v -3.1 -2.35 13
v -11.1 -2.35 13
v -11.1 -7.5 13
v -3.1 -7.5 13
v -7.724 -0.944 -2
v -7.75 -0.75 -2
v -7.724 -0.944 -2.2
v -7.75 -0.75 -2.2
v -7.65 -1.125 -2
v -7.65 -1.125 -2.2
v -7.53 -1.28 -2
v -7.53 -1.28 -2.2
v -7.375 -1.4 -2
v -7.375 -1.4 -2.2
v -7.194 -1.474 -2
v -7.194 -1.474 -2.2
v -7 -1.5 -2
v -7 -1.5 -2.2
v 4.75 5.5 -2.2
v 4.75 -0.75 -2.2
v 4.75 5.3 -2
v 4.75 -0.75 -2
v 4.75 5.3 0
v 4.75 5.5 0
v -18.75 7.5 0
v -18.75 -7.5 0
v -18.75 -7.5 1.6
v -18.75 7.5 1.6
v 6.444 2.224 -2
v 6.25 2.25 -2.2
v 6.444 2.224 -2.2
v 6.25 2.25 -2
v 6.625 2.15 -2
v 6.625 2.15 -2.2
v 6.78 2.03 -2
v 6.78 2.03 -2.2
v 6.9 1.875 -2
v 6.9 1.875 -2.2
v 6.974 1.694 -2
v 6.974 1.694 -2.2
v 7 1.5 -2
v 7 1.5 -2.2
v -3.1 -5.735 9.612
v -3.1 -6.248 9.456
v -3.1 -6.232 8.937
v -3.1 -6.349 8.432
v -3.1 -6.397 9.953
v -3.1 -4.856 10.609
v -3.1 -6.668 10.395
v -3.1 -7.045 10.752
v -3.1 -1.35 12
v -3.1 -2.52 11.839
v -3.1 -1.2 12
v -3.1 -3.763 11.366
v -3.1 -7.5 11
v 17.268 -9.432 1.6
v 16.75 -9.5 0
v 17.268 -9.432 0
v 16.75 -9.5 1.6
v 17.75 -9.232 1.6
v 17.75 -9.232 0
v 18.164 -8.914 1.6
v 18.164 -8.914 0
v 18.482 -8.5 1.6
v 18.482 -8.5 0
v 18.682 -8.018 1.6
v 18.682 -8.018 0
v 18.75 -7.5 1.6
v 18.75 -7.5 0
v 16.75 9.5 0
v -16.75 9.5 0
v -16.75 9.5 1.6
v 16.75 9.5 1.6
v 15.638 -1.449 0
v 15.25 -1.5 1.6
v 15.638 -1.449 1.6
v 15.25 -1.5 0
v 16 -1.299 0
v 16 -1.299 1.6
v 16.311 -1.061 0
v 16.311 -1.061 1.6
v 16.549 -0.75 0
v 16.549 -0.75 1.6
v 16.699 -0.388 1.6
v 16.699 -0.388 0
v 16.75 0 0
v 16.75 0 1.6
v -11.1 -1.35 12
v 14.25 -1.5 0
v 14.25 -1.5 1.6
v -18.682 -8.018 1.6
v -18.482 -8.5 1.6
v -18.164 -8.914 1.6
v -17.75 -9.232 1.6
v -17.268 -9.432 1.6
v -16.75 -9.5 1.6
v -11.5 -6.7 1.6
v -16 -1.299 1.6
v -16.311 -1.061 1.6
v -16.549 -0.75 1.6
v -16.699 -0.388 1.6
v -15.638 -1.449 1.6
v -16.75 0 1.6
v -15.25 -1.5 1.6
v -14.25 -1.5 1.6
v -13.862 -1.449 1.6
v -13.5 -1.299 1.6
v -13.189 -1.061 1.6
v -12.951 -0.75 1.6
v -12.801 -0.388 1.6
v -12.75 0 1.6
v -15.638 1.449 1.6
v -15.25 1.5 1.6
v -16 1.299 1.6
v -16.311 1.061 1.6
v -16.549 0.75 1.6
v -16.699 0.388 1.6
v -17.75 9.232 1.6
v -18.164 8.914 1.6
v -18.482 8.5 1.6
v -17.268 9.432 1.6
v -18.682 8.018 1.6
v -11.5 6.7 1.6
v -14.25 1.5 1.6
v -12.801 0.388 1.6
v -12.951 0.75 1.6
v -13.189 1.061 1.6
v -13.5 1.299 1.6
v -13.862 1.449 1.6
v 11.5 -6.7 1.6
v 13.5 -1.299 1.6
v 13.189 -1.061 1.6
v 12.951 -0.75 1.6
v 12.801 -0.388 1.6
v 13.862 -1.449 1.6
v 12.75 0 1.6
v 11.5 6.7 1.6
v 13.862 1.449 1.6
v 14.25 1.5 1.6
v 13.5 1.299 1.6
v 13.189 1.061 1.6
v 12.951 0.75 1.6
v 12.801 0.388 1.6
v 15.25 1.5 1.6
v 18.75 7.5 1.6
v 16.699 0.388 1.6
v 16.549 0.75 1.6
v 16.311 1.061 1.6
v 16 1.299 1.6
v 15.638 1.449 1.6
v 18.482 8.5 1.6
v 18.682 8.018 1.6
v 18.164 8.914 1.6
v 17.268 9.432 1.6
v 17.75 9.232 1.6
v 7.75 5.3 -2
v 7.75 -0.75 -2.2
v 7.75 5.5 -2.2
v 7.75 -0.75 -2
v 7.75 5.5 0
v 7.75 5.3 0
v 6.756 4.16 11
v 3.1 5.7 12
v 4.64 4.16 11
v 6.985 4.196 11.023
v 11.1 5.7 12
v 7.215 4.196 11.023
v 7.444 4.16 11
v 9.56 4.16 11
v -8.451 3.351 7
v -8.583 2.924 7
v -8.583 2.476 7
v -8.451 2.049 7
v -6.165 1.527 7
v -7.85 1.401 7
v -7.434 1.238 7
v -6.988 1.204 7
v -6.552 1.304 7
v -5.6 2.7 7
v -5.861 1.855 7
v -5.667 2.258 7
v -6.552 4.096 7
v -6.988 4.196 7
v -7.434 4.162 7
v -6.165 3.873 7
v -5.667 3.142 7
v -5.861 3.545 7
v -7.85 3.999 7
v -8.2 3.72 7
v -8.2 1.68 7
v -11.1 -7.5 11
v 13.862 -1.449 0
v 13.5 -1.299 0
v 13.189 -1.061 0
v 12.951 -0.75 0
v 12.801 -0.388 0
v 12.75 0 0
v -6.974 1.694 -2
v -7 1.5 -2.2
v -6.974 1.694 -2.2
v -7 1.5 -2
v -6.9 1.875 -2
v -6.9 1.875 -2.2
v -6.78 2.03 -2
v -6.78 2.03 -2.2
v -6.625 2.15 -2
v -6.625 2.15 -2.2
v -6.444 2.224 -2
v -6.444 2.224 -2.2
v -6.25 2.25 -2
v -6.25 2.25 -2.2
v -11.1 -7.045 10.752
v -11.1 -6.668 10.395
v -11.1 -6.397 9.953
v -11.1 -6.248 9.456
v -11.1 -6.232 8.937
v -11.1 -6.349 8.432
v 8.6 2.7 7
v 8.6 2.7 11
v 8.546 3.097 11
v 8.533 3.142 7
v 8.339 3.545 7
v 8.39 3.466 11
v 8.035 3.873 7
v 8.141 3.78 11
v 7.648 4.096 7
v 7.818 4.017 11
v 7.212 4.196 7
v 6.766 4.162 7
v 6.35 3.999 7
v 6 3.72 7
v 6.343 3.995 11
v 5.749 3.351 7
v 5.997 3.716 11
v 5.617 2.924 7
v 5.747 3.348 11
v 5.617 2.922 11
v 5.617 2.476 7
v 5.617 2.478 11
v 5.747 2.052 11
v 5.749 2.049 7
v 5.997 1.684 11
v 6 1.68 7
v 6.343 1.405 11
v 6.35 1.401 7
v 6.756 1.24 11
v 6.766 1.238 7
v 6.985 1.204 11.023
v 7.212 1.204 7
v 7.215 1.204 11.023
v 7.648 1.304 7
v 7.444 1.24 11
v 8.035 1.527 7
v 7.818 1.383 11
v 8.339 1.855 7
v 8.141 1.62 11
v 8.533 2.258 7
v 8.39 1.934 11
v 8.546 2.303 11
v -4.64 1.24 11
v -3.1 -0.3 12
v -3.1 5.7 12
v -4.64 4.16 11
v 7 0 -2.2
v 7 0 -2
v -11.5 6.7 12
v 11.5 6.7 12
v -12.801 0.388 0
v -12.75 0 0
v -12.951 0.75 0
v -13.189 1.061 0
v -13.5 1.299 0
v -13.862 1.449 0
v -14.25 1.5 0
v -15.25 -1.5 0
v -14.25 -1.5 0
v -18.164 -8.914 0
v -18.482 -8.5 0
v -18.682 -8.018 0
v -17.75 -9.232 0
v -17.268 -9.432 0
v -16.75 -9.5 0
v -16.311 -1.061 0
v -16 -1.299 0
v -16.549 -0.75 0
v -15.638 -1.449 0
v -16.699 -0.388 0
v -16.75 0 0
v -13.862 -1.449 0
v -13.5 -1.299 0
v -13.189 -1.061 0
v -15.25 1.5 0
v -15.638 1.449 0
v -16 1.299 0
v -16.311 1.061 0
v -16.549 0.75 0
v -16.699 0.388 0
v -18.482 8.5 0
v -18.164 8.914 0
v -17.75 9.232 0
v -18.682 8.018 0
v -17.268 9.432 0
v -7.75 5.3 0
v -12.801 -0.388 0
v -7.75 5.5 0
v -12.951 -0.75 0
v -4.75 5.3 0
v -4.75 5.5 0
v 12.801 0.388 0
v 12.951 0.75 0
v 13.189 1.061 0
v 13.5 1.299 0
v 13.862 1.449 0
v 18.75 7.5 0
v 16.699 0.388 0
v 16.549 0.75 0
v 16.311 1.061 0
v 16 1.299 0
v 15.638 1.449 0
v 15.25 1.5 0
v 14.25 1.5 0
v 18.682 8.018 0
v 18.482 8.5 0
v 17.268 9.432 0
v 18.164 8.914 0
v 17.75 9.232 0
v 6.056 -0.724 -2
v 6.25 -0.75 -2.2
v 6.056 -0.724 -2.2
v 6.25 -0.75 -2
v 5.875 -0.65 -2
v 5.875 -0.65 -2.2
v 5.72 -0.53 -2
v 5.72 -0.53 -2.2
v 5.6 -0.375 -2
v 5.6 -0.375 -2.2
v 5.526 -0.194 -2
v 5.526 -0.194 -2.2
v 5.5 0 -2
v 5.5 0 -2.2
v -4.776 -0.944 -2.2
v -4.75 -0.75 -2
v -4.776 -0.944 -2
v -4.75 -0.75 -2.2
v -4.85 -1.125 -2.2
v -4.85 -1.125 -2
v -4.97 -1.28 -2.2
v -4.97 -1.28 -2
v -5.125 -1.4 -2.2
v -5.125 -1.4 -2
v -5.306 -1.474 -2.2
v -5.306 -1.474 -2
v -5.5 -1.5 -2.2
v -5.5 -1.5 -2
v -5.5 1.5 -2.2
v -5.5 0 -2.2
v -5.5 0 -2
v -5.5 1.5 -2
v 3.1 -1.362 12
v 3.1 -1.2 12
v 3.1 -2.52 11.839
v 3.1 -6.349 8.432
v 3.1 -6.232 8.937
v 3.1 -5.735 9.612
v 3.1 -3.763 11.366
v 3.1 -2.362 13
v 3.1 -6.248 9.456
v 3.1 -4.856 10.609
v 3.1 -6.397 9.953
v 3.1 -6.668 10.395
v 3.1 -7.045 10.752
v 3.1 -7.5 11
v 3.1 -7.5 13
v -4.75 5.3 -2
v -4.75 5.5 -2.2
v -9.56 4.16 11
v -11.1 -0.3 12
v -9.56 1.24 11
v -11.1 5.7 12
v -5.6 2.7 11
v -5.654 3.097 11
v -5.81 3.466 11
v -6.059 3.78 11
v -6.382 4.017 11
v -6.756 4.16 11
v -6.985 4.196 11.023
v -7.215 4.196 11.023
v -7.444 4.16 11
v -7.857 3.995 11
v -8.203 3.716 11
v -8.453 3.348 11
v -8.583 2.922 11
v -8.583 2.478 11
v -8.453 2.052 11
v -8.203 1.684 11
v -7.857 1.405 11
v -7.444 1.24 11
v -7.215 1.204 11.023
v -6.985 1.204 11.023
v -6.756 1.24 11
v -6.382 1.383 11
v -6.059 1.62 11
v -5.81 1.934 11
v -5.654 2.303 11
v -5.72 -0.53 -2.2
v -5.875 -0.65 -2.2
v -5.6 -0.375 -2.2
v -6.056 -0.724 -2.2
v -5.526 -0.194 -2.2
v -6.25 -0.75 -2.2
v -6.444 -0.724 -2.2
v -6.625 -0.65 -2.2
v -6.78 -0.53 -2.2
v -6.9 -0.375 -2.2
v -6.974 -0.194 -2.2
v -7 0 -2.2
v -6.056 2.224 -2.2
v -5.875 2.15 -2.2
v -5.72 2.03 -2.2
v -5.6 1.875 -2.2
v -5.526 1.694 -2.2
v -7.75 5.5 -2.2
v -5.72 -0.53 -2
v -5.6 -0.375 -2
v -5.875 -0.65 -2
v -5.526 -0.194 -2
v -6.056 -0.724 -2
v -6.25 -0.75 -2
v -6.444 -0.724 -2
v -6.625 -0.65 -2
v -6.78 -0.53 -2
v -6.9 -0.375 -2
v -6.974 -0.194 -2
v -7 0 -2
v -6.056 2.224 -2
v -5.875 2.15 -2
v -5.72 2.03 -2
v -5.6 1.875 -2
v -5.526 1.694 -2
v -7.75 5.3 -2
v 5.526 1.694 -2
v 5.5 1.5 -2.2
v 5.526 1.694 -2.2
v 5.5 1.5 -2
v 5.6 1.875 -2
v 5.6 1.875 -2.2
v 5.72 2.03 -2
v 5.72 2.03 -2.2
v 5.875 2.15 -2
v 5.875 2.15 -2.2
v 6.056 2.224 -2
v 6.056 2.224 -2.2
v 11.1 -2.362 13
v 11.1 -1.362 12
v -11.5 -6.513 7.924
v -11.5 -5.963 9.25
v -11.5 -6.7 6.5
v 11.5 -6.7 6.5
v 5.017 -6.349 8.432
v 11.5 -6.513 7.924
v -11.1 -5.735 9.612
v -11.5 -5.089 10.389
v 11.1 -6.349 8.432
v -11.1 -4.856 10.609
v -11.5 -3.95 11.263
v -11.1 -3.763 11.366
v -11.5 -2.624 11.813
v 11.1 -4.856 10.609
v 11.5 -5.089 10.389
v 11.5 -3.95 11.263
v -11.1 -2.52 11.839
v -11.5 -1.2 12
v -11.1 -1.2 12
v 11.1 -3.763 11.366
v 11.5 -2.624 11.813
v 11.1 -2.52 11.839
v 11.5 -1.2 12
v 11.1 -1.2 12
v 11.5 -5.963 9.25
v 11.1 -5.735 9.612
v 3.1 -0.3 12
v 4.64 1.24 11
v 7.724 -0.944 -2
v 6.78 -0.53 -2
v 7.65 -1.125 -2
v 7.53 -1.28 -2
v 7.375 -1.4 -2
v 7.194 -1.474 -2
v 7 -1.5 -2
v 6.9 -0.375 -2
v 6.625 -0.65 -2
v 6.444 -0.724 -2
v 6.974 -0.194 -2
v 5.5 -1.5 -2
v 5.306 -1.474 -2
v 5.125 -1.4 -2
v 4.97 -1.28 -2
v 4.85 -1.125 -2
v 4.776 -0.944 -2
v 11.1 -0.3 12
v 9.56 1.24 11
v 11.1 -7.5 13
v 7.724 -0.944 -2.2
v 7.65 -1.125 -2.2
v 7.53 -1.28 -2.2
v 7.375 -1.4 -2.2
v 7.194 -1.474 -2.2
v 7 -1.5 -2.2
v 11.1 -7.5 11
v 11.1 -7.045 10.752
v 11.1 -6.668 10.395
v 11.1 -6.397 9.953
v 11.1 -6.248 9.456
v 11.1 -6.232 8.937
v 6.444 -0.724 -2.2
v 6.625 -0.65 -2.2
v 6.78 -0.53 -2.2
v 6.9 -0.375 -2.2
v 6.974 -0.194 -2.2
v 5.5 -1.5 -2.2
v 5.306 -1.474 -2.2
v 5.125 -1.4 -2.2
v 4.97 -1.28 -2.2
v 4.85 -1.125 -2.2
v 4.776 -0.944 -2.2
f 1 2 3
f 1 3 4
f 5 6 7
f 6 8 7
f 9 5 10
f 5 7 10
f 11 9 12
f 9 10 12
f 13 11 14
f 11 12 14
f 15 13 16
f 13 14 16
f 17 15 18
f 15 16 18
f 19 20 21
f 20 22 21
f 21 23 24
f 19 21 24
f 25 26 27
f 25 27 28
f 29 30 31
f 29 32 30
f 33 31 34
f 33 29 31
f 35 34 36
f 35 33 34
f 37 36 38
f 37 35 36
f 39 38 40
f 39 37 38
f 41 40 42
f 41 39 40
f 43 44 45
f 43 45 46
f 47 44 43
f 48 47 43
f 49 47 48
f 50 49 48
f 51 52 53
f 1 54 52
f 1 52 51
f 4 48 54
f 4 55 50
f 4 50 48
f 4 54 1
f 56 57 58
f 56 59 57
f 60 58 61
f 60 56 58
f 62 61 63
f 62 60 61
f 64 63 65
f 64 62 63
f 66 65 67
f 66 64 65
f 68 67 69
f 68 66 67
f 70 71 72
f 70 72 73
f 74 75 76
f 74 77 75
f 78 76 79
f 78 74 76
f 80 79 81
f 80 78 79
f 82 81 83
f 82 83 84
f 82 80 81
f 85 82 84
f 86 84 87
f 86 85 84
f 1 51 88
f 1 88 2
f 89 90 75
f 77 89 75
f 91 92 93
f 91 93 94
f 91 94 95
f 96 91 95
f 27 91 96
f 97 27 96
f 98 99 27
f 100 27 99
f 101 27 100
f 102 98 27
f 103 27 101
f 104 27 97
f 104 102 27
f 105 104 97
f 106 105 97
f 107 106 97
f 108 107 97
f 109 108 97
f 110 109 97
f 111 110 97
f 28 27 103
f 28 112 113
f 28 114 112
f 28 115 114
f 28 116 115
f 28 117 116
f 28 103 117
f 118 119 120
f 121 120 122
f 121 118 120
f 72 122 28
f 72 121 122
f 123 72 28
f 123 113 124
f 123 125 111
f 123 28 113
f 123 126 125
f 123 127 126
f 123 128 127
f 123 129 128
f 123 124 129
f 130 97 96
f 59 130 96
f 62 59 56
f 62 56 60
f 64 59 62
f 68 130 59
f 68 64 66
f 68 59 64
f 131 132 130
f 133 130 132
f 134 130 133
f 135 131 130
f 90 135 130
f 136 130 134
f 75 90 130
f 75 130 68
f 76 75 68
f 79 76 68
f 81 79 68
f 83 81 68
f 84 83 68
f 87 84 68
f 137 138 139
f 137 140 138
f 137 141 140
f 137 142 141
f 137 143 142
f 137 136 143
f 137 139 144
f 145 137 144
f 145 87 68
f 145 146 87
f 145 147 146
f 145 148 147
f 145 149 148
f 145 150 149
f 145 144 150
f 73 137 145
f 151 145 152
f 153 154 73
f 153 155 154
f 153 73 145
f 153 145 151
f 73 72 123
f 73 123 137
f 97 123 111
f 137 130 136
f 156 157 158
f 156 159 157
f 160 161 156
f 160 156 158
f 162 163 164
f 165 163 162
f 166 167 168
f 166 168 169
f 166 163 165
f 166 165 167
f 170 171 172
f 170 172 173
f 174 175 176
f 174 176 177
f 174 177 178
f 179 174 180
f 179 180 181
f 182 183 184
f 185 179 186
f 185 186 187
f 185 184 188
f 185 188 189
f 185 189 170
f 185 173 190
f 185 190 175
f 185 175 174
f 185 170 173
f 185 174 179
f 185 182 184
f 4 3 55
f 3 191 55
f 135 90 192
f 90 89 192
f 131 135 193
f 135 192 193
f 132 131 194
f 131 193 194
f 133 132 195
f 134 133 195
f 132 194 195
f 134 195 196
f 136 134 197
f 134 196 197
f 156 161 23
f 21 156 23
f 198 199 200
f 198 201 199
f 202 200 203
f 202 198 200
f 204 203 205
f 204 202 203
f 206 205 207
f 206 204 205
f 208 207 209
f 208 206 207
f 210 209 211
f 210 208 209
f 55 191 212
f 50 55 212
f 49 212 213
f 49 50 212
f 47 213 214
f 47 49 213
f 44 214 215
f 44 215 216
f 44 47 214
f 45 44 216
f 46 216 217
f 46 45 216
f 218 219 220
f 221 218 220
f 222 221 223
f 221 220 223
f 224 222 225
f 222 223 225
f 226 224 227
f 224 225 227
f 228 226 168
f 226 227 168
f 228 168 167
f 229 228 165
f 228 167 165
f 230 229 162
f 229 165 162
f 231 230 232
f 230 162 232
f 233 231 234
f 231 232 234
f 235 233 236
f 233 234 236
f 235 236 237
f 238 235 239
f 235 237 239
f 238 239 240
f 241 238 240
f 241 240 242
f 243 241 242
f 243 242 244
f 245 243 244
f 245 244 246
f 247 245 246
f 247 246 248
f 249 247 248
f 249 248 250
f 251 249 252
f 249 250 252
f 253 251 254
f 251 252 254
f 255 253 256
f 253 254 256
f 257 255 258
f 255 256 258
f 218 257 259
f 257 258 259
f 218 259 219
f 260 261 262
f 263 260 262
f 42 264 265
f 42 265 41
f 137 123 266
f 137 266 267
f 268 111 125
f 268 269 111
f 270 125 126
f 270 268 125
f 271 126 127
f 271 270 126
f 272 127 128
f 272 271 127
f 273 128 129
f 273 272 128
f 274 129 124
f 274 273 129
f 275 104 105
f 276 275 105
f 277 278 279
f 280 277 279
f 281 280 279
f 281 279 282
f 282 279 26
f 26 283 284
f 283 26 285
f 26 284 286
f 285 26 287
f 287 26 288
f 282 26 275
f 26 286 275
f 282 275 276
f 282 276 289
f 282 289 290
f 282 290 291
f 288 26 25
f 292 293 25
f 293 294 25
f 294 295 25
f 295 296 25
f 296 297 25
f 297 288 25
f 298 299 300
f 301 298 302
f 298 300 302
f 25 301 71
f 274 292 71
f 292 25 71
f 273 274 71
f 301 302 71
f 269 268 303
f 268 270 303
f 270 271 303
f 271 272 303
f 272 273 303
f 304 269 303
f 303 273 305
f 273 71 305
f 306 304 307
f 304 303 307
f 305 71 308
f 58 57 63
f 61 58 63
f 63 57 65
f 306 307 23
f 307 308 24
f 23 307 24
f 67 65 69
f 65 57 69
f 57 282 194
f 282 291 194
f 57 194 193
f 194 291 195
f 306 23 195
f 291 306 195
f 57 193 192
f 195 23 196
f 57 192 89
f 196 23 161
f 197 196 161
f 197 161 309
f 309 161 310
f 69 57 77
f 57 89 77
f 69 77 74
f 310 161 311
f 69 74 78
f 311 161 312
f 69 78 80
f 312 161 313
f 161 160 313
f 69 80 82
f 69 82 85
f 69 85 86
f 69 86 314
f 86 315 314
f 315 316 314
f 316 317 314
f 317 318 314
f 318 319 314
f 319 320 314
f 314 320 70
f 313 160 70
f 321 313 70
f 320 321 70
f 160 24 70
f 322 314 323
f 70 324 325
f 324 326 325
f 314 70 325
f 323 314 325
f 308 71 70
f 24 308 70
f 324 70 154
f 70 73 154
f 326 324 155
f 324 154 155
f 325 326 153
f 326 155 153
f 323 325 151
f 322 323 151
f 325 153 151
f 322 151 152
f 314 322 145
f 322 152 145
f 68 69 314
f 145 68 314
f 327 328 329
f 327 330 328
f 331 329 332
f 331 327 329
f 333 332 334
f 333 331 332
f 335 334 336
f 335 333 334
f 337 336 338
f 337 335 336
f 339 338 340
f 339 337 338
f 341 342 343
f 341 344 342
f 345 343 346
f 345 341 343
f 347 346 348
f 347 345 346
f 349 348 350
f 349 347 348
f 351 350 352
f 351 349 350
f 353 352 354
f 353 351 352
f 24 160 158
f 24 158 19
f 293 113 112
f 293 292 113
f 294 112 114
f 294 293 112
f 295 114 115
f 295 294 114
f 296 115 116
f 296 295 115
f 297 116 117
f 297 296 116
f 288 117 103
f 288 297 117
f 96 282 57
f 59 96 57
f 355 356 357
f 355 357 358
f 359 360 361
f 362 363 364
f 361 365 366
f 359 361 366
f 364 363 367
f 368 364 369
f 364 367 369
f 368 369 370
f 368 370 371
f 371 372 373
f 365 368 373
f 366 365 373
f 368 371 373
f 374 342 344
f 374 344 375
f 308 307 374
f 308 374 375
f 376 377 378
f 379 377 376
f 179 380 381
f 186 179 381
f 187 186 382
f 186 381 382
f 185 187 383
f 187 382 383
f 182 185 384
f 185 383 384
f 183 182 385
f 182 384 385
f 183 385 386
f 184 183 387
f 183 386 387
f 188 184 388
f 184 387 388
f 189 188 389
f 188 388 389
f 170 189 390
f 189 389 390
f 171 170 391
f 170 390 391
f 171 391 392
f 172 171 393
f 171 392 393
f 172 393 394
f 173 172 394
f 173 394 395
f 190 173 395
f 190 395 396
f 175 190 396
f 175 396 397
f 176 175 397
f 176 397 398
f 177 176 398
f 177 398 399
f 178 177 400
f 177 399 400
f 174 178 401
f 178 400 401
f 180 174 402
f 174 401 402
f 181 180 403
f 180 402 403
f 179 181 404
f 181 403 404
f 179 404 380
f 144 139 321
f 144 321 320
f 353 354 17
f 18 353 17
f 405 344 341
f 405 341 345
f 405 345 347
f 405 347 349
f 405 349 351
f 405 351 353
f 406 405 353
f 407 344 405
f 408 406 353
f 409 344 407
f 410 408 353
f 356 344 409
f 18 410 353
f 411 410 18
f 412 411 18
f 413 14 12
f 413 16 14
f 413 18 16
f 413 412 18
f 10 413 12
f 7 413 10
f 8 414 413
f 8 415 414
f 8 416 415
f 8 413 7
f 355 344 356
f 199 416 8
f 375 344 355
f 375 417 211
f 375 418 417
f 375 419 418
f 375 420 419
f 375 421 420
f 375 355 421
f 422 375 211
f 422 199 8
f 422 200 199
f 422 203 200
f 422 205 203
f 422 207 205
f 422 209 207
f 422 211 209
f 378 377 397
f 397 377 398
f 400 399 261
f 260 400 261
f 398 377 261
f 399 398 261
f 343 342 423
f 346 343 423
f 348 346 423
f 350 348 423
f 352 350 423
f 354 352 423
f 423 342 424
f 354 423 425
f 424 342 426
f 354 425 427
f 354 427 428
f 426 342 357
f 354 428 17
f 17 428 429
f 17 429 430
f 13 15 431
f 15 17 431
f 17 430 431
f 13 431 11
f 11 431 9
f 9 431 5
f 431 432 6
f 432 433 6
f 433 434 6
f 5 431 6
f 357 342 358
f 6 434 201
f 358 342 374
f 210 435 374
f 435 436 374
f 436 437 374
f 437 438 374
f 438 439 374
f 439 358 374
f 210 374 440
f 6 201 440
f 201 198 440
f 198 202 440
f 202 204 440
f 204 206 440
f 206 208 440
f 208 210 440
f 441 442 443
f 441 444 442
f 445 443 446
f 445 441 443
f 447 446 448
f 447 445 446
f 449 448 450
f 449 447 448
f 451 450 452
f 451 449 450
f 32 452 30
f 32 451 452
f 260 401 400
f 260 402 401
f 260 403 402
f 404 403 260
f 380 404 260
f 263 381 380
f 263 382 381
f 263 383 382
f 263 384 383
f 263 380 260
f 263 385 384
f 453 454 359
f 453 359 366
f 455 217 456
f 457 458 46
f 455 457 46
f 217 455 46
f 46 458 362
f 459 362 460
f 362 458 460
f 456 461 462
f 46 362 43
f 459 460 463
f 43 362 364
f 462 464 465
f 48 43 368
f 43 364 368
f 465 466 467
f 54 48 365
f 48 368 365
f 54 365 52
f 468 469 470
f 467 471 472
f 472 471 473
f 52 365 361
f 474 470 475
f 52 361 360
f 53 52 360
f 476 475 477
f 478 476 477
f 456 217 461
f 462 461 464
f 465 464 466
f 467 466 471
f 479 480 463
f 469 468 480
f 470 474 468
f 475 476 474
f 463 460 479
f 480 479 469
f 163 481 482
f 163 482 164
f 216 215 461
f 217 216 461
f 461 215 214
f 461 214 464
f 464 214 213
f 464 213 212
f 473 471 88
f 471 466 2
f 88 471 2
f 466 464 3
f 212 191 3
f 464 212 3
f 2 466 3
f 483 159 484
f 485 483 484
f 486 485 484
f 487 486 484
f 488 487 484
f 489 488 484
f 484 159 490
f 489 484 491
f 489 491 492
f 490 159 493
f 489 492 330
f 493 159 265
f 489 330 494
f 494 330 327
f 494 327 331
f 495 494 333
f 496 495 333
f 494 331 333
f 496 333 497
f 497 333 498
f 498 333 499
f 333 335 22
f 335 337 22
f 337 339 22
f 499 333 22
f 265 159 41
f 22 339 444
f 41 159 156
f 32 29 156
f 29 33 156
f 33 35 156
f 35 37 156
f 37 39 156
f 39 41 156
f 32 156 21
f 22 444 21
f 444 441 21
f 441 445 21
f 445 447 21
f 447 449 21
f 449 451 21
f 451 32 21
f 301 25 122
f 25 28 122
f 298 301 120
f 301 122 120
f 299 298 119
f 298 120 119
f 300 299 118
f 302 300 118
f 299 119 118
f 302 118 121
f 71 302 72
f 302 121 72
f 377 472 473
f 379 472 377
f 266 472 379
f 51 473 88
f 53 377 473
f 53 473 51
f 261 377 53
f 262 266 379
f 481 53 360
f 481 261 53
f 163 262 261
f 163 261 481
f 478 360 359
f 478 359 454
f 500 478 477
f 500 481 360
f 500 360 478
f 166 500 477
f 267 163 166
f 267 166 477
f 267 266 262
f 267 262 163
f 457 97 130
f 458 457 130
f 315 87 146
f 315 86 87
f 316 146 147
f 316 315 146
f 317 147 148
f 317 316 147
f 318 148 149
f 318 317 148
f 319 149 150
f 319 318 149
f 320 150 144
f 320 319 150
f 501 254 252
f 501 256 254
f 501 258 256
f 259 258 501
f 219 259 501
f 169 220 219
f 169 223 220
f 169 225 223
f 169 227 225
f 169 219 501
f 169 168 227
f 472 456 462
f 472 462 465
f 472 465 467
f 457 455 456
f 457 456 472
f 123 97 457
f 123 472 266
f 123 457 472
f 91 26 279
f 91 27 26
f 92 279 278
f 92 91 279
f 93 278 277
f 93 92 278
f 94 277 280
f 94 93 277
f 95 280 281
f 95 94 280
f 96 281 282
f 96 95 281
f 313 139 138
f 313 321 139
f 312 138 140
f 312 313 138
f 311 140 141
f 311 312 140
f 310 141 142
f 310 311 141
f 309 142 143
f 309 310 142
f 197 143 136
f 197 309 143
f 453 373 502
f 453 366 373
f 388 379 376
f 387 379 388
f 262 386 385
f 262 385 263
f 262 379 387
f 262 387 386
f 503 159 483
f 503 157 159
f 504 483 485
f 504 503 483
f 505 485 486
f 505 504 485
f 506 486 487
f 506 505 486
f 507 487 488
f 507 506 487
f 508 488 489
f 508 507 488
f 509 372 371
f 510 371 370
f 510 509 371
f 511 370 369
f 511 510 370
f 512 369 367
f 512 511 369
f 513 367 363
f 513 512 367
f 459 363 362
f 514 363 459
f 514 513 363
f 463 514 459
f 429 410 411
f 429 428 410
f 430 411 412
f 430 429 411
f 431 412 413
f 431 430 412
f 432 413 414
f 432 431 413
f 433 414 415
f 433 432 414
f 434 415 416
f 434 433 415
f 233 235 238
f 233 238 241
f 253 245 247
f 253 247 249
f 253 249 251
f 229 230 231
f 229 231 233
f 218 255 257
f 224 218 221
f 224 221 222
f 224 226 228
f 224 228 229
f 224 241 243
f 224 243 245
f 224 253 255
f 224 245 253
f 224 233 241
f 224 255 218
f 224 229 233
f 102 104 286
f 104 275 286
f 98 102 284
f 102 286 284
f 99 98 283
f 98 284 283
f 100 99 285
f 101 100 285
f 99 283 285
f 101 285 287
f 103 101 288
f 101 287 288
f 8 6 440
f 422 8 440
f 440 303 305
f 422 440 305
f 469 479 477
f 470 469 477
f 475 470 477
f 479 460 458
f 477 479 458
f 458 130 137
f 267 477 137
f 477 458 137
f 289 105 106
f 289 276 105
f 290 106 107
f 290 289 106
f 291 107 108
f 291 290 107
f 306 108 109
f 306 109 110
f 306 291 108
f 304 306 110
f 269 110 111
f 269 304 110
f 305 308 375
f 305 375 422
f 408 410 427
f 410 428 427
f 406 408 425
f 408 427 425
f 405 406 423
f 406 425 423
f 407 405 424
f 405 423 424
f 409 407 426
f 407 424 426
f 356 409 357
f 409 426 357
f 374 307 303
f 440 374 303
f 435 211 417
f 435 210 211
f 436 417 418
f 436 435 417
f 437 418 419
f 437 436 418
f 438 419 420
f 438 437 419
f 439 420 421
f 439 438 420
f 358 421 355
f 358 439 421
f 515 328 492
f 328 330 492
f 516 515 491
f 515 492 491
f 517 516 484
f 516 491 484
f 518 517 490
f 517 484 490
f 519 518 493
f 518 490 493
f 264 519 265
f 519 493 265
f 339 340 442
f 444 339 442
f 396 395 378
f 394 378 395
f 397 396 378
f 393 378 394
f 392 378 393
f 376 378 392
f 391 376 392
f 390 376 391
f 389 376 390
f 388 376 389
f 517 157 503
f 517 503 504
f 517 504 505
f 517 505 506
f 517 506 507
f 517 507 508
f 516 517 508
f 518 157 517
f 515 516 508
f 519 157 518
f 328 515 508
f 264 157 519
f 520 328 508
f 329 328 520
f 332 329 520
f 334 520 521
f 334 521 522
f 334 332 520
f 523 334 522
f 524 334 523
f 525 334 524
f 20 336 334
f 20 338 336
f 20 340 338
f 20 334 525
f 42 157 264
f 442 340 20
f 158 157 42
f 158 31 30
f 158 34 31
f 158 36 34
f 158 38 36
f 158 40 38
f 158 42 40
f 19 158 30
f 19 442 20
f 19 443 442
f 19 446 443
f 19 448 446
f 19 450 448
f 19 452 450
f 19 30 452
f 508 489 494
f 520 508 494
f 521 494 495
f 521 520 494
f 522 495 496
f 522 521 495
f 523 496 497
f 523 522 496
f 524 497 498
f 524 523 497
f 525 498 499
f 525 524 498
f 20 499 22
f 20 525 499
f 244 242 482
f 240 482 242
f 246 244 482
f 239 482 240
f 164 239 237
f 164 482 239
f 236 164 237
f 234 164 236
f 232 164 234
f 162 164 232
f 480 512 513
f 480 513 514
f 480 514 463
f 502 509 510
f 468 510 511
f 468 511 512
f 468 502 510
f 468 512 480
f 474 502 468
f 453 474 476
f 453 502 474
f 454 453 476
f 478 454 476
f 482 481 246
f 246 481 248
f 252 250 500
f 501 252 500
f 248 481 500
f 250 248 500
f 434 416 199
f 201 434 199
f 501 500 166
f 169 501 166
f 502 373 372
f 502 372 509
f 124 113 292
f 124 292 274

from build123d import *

# Parameters (mm, degrees)
SKETCH_2_W                    = 37.5
SKETCH_2_H                    = 19
EXTRUDE_1_DEPTH               = 1.6
SKETCH_3_W                    = 23
SKETCH_3_H                    = 13.4
EXTRUDE_2_DEPTH               = 10.4
FILLET_1_R                    = 2
SKETCH_4_W                    = 4
SKETCH_4_H                    = 3
CUT_EXTRUDE_1_DEPTH           = 1.6
FILLET_2_R                    = 1.5
SKETCH_5_R                    = 1.5
CUT_EXTRUDE_2_DEPTH           = 5
SKETCH_6_W                    = 8
SKETCH_6_H                    = 6
CUT_EXTRUDE_3_DEPTH           = 1
CUT_EXTRUDE_3_DRAFT           = -57
CUT_EXTRUDE_3_PROFILE_2_DEPTH = 1
CUT_EXTRUDE_3_PROFILE_2_DRAFT = -57
FILLET_3_R                    = 5.5
SKETCH_7_W                    = 8
SKETCH_7_H                    = 7
EXTRUDE_3_DEPTH               = 1
SKETCH_8_W                    = 8
SKETCH_8_H                    = 3.15
SKETCH_8_H_2                  = 3.13772234
EXTRUDE_4_DEPTH               = 1
FILLET_4_R                    = 2
SKETCH_9_W                    = 3
SKETCH_9_H                    = 0.2
EXTRUDE_5_DEPTH               = 2
SKETCH_10_W                   = 3
SKETCH_10_H                   = 7
EXTRUDE_6_DEPTH               = 0.2
SKETCH_11_W                   = 1.5
SKETCH_11_H                   = 3
CUT_EXTRUDE_4_DEPTH           = 0.2
FILLET_5_R                    = 0.75


# Some blends are built 0.0001 mm under size
with BuildPart() as part:
    # Эскиз2 → Бобышка-Вытянуть1 (new body)
    with BuildSketch(Plane.XY):
        Rectangle(SKETCH_2_W, SKETCH_2_H)
    extrude(amount=EXTRUDE_1_DEPTH)

    # Эскиз3 → Бобышка-Вытянуть2 (add)
    with BuildSketch(Plane.XY.offset(1.6)):
        Rectangle(SKETCH_3_W, SKETCH_3_H)
    extrude(amount=EXTRUDE_2_DEPTH)

    # Скругление1
    fillet_1_edges = [part.edges().sort_by_distance(p)[0] for p in [
        (-18.75, 9.5, 0.8),
        (18.75, 9.5, 0.8),
        (18.75, -9.5, 0.8),
        (-18.75, -9.5, 0.8),
    ]]
    fillet(fillet_1_edges, radius=FILLET_1_R)

    # Эскиз4 → Вырез-Вытянуть1 (cut)
    with BuildSketch(Plane.XY.offset(1.6)):
        with Locations((14.75, 0)):
            Rectangle(SKETCH_4_W, SKETCH_4_H)
        with Locations((-14.75, 0)):
            Rectangle(SKETCH_4_W, SKETCH_4_H)
    extrude(amount=-CUT_EXTRUDE_1_DEPTH, mode=Mode.SUBTRACT)

    # Скругление2
    fillet_2_edges = [part.edges().sort_by_distance(p)[0] for p in [
        (-16.75, 1.5, 0.8),
        (-12.75, 1.5, 0.8),
        (16.75, 1.5, 0.8),
        (16.75, -1.5, 0.8),
        (-12.75, -1.5, 0.8),
        (-16.75, -1.5, 0.8),
        (12.75, -1.5, 0.8),
        (12.75, 1.5, 0.8),
    ]]
    fillet(fillet_2_edges, radius=FILLET_2_R - 0.0001)  # a hair under: the kernel refuses the full size

    # Эскиз5 → Вырез-Вытянуть2 (cut)
    with BuildSketch(Plane.XY.offset(12)):
        with Locations((-7.1, 2.7)):
            Circle(SKETCH_5_R)
        with Locations((7.1, 2.7)):
            Circle(SKETCH_5_R)
    extrude(amount=-CUT_EXTRUDE_2_DEPTH, mode=Mode.SUBTRACT)


with BuildPart() as cut_extrude_3_tool:
    # Эскиз6 → Вырез-Вытянуть3 (with draft: the straight prism first)
    with BuildSketch(Plane.XY.offset(12)):
        with Locations((-7.1, 2.7)):
            Rectangle(SKETCH_6_W, SKETCH_6_H)
    extrude(amount=-CUT_EXTRUDE_3_DEPTH)
    # Вырез-Вытянуть3: the draft: its side faces are tilted about the plane it starts from
    cut_extrude_3_sides = [cut_extrude_3_tool.faces().sort_by_distance(p)[0] for p in [
        (-11.1, 2.7, 11.5),
        (-7.1, -0.3, 11.5),
        (-3.1, 2.7, 11.5),
        (-7.1, 5.7, 11.5),
    ]]
    draft(cut_extrude_3_sides, Plane.XY.offset(12), CUT_EXTRUDE_3_DRAFT)


with BuildPart() as part_1:
    add(part.part)

    # Вырез-Вытянуть3: cut by cut_extrude_3_tool
    add(cut_extrude_3_tool.part, mode=Mode.SUBTRACT)


with BuildPart() as cut_extrude_3_profile_2_tool:
    # Эскиз6 → Вырез-Вытянуть3 profile 2 (with draft: the straight prism first)
    with BuildSketch(Plane.XY.offset(12)):
        with Locations((7.1, 2.7)):
            Rectangle(SKETCH_6_W, SKETCH_6_H)
    extrude(amount=-CUT_EXTRUDE_3_PROFILE_2_DEPTH)
    # Вырез-Вытянуть3 profile 2: the draft: its side faces are tilted about the plane it starts from
    cut_extrude_3_profile_2_sides = [cut_extrude_3_profile_2_tool.faces().sort_by_distance(p)[0] for p in [
        (3.1, 2.7, 11.5),
        (7.1, -0.3, 11.5),
        (11.1, 2.7, 11.5),
        (7.1, 5.7, 11.5),
    ]]
    draft(cut_extrude_3_profile_2_sides, Plane.XY.offset(12), CUT_EXTRUDE_3_PROFILE_2_DRAFT)


with BuildPart() as part_2:
    add(part_1.part)

    # Вырез-Вытянуть3 profile 2: cut by cut_extrude_3_profile_2_tool
    add(cut_extrude_3_profile_2_tool.part, mode=Mode.SUBTRACT)

    # Скругление3
    fillet_3_edges = [part_2.edges().sort_by_distance(p)[0] for p in [
        (0, -6.7, 12),
    ]]
    fillet(fillet_3_edges, radius=FILLET_3_R)

    # Эскиз7 → Бобышка-Вытянуть3 (add)
    with BuildSketch(Plane.XY.offset(12)):
        with Locations((-7.1, -4)):
            Rectangle(SKETCH_7_W, SKETCH_7_H)
        with Locations((7.1, -4)):
            Rectangle(SKETCH_7_W, SKETCH_7_H)
    extrude(amount=-EXTRUDE_3_DEPTH)

    # Эскиз8 → Бобышка-Вытянуть4 (add)
    with BuildSketch(Plane.XY.offset(12)):
        with Locations((-7.1, -5.925)):
            Rectangle(SKETCH_8_W, SKETCH_8_H)
        with Locations((7.1, -5.93113883)):
            Rectangle(SKETCH_8_W, SKETCH_8_H_2)
    extrude(amount=EXTRUDE_4_DEPTH)

    # Фаска1
    # the kernel refuses this chamfer: 3 mm, written as the material it adds along each edge
    with BuildSketch(Plane(origin=(-3.1, -4.35, 12), x_dir=(0, 0.9996219169112968, -0.027495876610586202), z_dir=(-1, 0, 0))) as chamfer_1_piece_1_section:
        with BuildLine():
            Line((3.086019586, 0), (-0.169641465, -3.081353381))
            Line((-0.169641465, -3.081353381), (-0.22961878, -3.079703628))
            ThreePointArc((-0.22961878, -3.079703628), (-0.102387681, -1.540193489), (-0.059977315, 0.001649753))
            Line((-0.059977315, 0.001649753), (0.001649753, 0.059977315))
            ThreePointArc((0.001649753, 0.059977315), (1.543492994, 0.017566949), (3.087669338, 0.059977315))
            Line((3.087669338, 0.059977315), (3.086019586, 0))
        make_face()
    chamfer_1_piece_1 = extrude(amount=8, mode=Mode.PRIVATE)
    chamfer_1_piece_1 = split(chamfer_1_piece_1, bisect_by=Plane(origin=(-7.1, -3.063879333, 13), z_dir=(0, 0, -1)), keep=Keep.TOP, mode=Mode.PRIVATE)
    add(chamfer_1_piece_1)
    with BuildSketch(Plane(origin=(11.1, -4.36227766, 12), x_dir=(0, 0.9996219169112968, -0.027495876610586202), z_dir=(-1, 0, 0))) as chamfer_1_piece_2_section:
        with BuildLine():
            Line((3.086019586, 0), (-0.169641465, -3.081353381))
            Line((-0.169641465, -3.081353381), (-0.22961878, -3.079703628))
            ThreePointArc((-0.22961878, -3.079703628), (-0.102387681, -1.540193489), (-0.059977315, 0.001649753))
            Line((-0.059977315, 0.001649753), (0.001649753, 0.059977315))
            ThreePointArc((0.001649753, 0.059977315), (1.543492994, 0.017566949), (3.087669338, 0.059977315))
            Line((3.087669338, 0.059977315), (3.086019586, 0))
        make_face()
    chamfer_1_piece_2 = extrude(amount=8, mode=Mode.PRIVATE)
    chamfer_1_piece_2 = split(chamfer_1_piece_2, bisect_by=Plane(origin=(7.1, -3.076156993, 13), z_dir=(0, 0, -1)), keep=Keep.TOP, mode=Mode.PRIVATE)
    add(chamfer_1_piece_2)

    # Скругление4
    # the kernel refuses this fillet: 2 mm, written as the material it adds along each edge
    with BuildSketch(Plane(origin=(5.017202419, -4.36227766, 11), x_dir=(0, -0.6120158801433927, -0.7908454731819031), z_dir=(-1, 0, 0))) as fillet_4_piece_1_section:
        with BuildLine():
            CenterArc((3.837222962, 1.910888885), FILLET_4_R, 163.424275541, 89.407933075)
            Line((1.920335899, 2.481453509), (1.881998158, 2.492864801))
            ThreePointArc((1.881998158, 2.492864801), (0.928534131, 1.265207389), (-0.031633819, 0.024480635))
            Line((-0.031633819, 0.024480635), (0.01180684, -0.038217778))
            ThreePointArc((0.01180684, -0.038217778), (1.623440484, 0.205055567), (3.235074128, -0.038217778))
            Line((3.235074128, -0.038217778), (3.246880968, 0))
        make_face()
    fillet_4_piece_1 = extrude(amount=16.117202419, mode=Mode.PRIVATE)
    fillet_4_piece_1 = split(fillet_4_piece_1, bisect_by=Plane(origin=(3.1, -5.888894845, 10.384505844), z_dir=(1, 0, 0)), keep=Keep.TOP, mode=Mode.PRIVATE)
    add(fillet_4_piece_1)
    with BuildSketch(Plane(origin=(-3.1, -4.36227766, 11), x_dir=(0, -0.6120158801433927, -0.7908454731819031), z_dir=(-1, 0, 0))) as fillet_4_piece_2:
        with BuildLine():
            CenterArc((3.837222962, 1.910888885), FILLET_4_R, 163.424275541, 89.407933075)
            Line((1.920335899, 2.481453509), (1.881998158, 2.492864801))
            ThreePointArc((1.881998158, 2.492864801), (0.928534131, 1.265207389), (-0.031633819, 0.024480635))
            Line((-0.031633819, 0.024480635), (0.01180684, -0.038217778))
            ThreePointArc((0.01180684, -0.038217778), (1.623440484, 0.205055567), (3.235074128, -0.038217778))
            Line((3.235074128, -0.038217778), (3.246880968, 0))
        make_face()
    extrude(amount=8)
    with BuildSketch(Plane(origin=(11.1, -4.36227766, 11), x_dir=(0, -1, 0), z_dir=(-1, 0, 0))) as fillet_4_piece_3:
        with BuildLine():
            CenterArc((3.859659213, -1.865156066), FILLET_4_R, 111.159682929, 89.407933075)
            Line((1.987142713, -2.567781115), (1.949692383, -2.581833616))
            ThreePointArc((1.949692383, -2.581833616), (1.155738623, -1.158393294), (-0.022998383, -0.032727273))
            Line((-0.022998383, -0.032727273), (0, 0.04))
            ThreePointArc((0, 0.04), (1.56886117, 0.04), (3.123283602, 0.037303121))
            Line((3.123283602, 0.037303121), (3.13772234, 0))
        make_face()
    extrude(amount=8)
    with BuildSketch(Plane(origin=(11.1, -4.36227766, 11), x_dir=(0, -1, 0), z_dir=(-1, 0, 0))) as fillet_4_piece_4_section:
        with BuildLine():
            CenterArc((3.859659213, -1.865156066), FILLET_4_R, 111.159682929, 89.407933075)
            Line((1.987142713, -2.567781115), (1.949692383, -2.581833616))
            ThreePointArc((1.949692383, -2.581833616), (1.155738623, -1.158393294), (-0.022998383, -0.032727273))
            Line((-0.022998383, -0.032727273), (0, 0.04))
            ThreePointArc((0, 0.04), (1.56886117, 0.04), (3.123283602, 0.037303121))
            Line((3.123283602, 0.037303121), (3.13772234, 0))
        make_face()
    fillet_4_piece_4 = extrude(amount=16.117202419, mode=Mode.PRIVATE)
    fillet_4_piece_4 = split(fillet_4_piece_4, bisect_by=Plane(origin=(-3.1, -5.888894845, 10.384505844), z_dir=(-1, 0, 0)), keep=Keep.TOP, mode=Mode.PRIVATE)
    add(fillet_4_piece_4)

    # Эскиз9 → Бобышка-Вытянуть5 (add)
    with BuildSketch(Plane(origin=(0, 0, 0), x_dir=(-1, 0, 0), z_dir=(0, 0, -1))):
        with Locations((-6.25, 5.4)):
            Rectangle(SKETCH_9_W, SKETCH_9_H)
        with Locations((6.25, 5.4)):
            Rectangle(SKETCH_9_W, SKETCH_9_H)
    extrude(amount=EXTRUDE_5_DEPTH)

    # Эскиз10 → Бобышка-Вытянуть6 (add)
    with BuildSketch(Plane(origin=(0, 0, -2), x_dir=(-1, 0, 0), z_dir=(0, 0, -1))):
        with Locations((-6.25, 2)):
            Rectangle(SKETCH_10_W, SKETCH_10_H)
        with Locations((6.25, 2)):
            Rectangle(SKETCH_10_W, SKETCH_10_H)
    extrude(amount=EXTRUDE_6_DEPTH)

    # Эскиз11 → Вырез-Вытянуть4 (cut)
    with BuildSketch(Plane(origin=(0, 0, -2.2), x_dir=(-1, 0, 0), z_dir=(0, 0, -1))):
        with Locations((-6.25, 0.75)):
            Rectangle(SKETCH_11_W, SKETCH_11_H)
        with Locations((6.25, 0.75)):
            Rectangle(SKETCH_11_W, SKETCH_11_H)
    extrude(amount=-CUT_EXTRUDE_4_DEPTH, mode=Mode.SUBTRACT)

    # Скругление5
    fillet_5_edges = [part_2.edges().sort_by_distance(p)[0] for p in [
        (-7, 2.25, -2.1),
        (-7, -0.75, -2.1),
        (5.5, -0.75, -2.1),
        (7, -0.75, -2.1),
        (-5.5, -0.75, -2.1),
        (-5.5, 2.25, -2.1),
        (4.75, -1.5, -2.1),
        (7, 2.25, -2.1),
        (7.75, -1.5, -2.1),
        (5.5, 2.25, -2.1),
        (-7.75, -1.5, -2.1),
        (-4.75, -1.5, -2.1),
    ]]
    fillet(fillet_5_edges, radius=FILLET_5_R - 0.0001)  # a hair under: the kernel refuses the full size


solid = part_2.part
